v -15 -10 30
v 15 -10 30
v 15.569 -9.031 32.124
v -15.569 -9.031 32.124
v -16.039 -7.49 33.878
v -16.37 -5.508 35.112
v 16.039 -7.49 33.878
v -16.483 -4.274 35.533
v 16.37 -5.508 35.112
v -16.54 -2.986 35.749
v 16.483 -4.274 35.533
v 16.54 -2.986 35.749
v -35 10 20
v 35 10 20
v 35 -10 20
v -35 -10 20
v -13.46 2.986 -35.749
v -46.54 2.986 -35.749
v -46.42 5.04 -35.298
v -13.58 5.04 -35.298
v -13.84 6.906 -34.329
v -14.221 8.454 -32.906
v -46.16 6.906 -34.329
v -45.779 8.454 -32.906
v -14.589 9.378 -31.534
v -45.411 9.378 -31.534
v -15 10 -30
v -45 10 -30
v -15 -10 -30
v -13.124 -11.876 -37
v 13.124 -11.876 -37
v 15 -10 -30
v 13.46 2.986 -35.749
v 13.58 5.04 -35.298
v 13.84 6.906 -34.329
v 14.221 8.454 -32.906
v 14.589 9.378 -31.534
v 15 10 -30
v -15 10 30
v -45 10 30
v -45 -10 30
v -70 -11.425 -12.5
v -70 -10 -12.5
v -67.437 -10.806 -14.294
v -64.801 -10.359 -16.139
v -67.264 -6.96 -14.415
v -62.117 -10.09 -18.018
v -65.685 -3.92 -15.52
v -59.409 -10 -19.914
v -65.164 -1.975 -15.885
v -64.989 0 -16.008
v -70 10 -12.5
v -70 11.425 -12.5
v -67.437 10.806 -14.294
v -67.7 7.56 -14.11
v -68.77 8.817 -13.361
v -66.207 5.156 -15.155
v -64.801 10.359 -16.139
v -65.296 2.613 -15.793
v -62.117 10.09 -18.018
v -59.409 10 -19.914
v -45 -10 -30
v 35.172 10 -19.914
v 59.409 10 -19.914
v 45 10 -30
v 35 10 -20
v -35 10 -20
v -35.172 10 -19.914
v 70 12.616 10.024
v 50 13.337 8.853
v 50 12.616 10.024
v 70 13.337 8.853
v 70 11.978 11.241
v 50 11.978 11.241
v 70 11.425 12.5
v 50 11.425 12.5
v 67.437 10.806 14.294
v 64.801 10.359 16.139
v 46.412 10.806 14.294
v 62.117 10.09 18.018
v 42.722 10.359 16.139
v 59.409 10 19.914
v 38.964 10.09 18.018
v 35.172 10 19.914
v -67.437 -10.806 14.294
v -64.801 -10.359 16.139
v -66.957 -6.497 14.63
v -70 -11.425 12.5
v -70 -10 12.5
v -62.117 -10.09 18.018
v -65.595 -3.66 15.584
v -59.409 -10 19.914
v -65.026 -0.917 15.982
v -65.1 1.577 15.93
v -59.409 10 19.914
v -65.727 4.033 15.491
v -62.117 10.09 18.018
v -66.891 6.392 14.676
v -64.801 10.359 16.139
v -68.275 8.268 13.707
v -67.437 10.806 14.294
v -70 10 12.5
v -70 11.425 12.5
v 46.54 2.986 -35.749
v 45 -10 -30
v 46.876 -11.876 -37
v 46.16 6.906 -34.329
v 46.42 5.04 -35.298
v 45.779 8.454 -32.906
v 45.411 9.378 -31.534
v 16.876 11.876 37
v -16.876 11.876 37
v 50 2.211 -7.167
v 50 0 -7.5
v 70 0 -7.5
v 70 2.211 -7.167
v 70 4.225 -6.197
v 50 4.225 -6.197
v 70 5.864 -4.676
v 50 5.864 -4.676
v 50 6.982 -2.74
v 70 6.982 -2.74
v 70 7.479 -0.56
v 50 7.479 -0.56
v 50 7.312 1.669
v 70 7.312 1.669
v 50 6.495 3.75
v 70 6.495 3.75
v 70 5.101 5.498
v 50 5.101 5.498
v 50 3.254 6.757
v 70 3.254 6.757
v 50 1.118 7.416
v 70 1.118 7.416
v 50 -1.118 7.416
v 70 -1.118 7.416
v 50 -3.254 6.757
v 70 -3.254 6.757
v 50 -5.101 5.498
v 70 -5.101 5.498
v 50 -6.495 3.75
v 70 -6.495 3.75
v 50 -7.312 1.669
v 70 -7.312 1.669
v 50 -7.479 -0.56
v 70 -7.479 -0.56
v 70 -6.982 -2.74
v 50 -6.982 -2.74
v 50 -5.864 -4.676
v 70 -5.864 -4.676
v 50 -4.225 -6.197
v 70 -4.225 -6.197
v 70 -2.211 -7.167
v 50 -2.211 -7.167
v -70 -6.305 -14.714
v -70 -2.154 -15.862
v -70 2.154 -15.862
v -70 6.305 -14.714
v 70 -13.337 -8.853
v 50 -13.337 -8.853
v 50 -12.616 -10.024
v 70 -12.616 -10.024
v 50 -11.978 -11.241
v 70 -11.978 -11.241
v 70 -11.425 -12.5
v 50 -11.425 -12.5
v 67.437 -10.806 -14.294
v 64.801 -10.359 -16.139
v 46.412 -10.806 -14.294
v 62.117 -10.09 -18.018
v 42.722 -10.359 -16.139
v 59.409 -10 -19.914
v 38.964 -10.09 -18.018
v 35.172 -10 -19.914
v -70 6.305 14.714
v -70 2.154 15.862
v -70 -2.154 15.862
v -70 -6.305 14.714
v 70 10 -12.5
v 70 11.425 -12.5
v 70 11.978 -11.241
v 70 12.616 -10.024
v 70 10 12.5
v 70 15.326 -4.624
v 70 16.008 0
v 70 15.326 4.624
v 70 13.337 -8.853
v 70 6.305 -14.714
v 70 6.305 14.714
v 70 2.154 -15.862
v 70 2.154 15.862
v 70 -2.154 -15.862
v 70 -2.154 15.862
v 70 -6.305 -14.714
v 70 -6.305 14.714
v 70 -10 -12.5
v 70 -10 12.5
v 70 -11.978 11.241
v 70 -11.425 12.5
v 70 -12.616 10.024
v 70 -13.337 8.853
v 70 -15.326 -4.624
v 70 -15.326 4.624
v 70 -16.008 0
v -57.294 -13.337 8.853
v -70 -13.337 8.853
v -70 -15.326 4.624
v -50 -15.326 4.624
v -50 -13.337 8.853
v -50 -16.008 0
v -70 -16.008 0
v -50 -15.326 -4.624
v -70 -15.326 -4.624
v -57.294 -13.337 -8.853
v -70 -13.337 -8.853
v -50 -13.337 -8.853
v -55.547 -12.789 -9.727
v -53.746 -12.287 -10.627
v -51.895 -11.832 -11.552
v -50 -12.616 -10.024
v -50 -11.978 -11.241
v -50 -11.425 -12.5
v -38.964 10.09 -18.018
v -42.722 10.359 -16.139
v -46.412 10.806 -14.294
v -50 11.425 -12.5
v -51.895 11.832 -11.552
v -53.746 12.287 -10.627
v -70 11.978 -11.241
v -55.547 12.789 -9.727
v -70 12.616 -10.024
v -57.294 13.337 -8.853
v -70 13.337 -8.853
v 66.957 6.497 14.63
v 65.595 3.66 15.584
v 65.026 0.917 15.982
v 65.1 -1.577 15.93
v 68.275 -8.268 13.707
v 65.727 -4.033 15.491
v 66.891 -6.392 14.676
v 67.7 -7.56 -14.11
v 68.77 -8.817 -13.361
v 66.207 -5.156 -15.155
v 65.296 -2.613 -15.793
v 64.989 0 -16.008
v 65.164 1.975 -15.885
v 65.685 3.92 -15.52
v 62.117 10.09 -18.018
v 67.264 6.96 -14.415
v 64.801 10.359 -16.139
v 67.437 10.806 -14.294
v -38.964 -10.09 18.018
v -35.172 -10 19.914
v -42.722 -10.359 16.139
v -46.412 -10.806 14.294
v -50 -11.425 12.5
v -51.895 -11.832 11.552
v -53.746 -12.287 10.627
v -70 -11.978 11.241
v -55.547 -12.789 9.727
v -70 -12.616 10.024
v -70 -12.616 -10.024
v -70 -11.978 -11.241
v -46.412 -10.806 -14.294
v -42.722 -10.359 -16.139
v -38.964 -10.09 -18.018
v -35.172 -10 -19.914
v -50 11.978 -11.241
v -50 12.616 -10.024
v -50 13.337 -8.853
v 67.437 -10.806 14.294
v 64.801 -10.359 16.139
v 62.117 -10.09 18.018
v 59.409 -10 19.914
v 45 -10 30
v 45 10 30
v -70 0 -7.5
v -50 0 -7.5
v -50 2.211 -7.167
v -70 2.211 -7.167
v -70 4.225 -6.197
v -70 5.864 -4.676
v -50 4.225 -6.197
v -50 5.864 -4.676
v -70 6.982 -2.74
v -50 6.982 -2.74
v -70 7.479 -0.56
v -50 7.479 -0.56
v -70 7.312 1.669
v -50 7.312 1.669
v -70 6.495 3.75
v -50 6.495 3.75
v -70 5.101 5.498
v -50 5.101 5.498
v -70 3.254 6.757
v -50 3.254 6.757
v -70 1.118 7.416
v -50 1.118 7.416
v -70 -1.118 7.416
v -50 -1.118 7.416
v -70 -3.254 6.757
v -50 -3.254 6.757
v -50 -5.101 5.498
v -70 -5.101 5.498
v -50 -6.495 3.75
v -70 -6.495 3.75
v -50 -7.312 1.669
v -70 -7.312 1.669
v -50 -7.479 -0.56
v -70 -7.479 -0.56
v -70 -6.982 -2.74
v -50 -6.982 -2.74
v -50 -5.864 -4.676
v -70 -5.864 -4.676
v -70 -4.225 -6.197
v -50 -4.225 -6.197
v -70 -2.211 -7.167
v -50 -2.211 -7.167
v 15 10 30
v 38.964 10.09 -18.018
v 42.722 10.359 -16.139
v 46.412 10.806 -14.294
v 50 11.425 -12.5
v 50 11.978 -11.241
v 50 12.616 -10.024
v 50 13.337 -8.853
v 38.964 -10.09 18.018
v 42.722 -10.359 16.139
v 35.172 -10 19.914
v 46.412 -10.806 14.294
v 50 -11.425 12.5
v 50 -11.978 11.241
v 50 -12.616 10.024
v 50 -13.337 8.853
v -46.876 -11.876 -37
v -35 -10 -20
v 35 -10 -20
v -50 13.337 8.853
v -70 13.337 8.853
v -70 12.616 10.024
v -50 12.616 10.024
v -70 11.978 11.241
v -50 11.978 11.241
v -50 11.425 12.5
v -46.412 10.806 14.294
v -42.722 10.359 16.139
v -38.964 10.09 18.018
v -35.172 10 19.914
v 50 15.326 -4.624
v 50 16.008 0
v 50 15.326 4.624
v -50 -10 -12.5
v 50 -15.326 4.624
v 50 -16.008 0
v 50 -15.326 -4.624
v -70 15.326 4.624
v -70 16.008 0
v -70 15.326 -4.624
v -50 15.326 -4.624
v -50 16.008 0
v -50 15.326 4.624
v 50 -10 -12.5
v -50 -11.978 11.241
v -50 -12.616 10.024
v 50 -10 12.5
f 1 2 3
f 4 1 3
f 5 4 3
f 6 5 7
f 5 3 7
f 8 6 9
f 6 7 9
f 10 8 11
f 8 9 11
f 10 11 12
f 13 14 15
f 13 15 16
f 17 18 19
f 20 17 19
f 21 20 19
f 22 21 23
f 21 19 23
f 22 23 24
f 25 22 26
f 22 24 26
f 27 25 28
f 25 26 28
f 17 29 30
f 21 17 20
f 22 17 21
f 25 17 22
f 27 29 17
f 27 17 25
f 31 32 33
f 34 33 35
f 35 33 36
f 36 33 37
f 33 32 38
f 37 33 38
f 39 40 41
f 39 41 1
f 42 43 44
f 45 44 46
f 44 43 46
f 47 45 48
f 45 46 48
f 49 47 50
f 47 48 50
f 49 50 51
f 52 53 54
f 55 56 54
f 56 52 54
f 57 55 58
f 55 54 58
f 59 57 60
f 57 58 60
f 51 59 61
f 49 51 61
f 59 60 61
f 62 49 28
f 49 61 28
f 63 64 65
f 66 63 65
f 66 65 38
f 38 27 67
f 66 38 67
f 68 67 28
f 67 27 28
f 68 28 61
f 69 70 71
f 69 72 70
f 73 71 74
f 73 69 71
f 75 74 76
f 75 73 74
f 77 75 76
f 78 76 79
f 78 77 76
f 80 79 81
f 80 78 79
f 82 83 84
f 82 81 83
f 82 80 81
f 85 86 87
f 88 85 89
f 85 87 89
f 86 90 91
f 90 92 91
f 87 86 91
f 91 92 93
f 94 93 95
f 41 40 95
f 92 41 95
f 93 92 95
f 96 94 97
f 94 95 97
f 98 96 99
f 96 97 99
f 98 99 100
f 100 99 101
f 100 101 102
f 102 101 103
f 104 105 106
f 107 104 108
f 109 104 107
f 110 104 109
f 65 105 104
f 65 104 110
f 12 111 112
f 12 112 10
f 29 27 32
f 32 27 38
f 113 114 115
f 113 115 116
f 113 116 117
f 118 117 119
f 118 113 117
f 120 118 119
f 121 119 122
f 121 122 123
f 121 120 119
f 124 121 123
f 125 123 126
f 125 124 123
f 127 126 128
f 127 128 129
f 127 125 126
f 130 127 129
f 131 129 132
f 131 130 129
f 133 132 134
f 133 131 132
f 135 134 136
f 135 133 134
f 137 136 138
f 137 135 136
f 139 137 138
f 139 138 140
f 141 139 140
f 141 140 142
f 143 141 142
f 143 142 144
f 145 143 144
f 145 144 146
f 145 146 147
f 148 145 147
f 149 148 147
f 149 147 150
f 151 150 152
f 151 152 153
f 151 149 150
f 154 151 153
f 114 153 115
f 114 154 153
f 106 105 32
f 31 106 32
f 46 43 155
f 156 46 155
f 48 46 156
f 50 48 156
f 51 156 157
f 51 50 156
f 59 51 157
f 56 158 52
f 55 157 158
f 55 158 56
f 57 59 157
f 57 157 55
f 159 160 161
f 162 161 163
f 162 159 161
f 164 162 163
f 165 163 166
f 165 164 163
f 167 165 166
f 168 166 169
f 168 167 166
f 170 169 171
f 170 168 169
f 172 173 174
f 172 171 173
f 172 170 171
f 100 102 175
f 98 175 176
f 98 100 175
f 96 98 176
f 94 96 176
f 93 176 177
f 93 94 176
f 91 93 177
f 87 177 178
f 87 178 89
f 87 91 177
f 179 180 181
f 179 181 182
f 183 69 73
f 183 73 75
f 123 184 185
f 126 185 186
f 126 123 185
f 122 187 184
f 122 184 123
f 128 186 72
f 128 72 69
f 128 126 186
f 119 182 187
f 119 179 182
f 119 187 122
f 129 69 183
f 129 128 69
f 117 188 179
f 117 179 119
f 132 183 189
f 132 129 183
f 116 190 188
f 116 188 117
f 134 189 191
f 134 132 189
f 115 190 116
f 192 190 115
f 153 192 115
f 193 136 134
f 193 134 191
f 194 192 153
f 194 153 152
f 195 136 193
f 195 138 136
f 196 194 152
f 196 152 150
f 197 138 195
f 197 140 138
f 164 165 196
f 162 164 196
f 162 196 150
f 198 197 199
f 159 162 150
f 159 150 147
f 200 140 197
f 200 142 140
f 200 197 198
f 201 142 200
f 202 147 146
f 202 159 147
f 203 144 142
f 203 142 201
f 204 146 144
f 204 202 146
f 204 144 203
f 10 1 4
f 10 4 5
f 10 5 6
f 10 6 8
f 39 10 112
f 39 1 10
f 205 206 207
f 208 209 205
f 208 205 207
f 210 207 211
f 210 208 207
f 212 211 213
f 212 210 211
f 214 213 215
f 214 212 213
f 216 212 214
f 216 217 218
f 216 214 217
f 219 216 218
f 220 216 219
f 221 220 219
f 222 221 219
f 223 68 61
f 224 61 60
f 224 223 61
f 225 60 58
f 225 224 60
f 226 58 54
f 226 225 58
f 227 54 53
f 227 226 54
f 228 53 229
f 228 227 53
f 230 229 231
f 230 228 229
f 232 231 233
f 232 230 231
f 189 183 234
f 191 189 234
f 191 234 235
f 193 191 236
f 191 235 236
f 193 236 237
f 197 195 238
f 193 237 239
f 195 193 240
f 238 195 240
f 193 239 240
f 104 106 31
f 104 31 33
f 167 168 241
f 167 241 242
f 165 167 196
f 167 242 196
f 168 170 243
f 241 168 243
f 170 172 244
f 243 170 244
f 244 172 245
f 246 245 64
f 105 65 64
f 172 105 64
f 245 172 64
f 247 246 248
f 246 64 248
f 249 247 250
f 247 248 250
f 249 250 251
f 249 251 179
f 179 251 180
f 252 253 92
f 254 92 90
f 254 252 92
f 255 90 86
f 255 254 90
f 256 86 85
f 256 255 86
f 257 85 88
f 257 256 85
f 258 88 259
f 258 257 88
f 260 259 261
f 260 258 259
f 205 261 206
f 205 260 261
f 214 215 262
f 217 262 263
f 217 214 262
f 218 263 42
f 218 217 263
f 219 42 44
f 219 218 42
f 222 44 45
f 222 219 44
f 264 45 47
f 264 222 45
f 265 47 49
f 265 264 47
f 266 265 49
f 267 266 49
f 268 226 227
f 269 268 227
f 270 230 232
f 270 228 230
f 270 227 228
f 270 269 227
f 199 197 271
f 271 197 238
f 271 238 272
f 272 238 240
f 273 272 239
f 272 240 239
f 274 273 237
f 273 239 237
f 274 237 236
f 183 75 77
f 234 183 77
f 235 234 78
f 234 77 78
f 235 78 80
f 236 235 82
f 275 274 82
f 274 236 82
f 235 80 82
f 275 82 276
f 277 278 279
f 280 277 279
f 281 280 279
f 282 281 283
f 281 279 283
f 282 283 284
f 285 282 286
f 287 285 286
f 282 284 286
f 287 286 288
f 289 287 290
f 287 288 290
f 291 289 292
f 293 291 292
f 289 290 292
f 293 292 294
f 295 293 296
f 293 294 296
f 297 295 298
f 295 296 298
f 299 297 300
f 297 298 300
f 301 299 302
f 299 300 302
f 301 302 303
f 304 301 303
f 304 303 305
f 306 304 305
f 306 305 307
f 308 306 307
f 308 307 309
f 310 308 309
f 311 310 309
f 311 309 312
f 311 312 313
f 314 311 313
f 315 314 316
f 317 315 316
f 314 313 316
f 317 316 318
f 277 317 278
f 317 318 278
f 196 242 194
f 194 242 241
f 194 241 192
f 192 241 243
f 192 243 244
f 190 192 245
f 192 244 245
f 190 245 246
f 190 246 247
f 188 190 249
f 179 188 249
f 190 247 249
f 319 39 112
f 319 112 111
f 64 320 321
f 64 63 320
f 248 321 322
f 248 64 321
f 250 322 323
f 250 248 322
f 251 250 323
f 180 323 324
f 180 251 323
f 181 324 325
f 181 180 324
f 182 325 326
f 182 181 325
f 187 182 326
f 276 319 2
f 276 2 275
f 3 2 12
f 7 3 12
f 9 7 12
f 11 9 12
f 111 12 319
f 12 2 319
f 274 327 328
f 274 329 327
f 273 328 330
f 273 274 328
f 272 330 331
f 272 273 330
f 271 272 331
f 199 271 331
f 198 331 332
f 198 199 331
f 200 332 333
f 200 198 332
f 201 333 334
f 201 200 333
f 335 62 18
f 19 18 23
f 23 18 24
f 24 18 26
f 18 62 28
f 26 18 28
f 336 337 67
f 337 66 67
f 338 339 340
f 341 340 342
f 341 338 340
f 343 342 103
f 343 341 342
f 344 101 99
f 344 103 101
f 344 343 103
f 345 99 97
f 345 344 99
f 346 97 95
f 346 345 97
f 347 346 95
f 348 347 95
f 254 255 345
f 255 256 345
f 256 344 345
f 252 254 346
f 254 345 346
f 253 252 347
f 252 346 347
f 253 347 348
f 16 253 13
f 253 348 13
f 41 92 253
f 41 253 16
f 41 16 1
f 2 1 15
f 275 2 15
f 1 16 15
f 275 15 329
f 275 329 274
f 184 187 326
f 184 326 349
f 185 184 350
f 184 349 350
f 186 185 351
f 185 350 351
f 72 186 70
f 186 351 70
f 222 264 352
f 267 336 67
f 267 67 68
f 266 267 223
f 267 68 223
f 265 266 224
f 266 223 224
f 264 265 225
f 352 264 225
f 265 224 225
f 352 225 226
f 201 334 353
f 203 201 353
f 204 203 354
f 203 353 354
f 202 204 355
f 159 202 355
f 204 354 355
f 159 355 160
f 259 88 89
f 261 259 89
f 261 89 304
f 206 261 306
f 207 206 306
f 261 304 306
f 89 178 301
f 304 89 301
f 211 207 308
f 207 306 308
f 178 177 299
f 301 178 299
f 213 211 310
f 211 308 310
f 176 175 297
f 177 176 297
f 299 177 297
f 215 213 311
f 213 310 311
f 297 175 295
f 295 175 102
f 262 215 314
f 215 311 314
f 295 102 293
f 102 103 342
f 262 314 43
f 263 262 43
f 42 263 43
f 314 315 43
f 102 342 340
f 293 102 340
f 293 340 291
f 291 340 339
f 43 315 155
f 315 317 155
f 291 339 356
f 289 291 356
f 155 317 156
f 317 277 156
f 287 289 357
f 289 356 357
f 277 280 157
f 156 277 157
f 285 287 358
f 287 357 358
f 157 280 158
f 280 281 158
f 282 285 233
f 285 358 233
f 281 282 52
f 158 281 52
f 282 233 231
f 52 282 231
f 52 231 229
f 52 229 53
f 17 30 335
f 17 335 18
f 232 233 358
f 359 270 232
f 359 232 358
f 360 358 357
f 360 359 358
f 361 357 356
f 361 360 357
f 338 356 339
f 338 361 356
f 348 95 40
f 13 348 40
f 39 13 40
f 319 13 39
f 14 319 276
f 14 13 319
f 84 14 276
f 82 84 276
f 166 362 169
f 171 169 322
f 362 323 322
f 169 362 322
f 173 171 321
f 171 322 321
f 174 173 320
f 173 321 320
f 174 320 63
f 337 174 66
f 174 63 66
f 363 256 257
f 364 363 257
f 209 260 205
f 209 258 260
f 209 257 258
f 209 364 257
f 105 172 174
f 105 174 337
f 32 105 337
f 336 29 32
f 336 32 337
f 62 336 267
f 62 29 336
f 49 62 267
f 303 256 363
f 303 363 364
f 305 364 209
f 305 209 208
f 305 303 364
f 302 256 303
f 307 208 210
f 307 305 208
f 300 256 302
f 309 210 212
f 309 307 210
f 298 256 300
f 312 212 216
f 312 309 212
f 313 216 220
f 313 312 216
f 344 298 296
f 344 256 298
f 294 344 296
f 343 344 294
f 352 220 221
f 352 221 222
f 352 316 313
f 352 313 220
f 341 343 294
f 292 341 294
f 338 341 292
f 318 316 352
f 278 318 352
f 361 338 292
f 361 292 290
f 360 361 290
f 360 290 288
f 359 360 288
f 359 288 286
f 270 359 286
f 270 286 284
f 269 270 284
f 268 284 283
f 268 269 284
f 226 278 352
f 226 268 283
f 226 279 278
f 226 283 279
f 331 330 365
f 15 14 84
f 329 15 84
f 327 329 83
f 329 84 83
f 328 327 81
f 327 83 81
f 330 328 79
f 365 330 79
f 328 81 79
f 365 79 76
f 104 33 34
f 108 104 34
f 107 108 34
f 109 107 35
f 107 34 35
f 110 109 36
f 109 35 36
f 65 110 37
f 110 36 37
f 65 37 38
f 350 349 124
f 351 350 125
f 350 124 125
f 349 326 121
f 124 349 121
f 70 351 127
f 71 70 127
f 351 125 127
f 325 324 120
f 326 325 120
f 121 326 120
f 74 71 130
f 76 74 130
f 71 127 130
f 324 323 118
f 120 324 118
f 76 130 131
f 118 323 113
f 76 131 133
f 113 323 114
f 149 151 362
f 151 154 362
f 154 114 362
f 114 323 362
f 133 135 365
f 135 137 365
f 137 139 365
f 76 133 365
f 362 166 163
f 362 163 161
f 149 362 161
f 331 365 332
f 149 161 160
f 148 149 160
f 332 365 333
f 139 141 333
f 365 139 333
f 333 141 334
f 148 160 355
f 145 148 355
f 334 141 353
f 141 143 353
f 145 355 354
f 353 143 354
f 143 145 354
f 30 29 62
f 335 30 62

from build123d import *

# Parameters (mm, degrees)
RESSALTO_EXTRUS_O1_DEPTH           = 10
RESSALTO_EXTRUS_O1_2_DEPTH         = 10
ESBO_O2_R                          = 16.007810594
ESBO_O2_R_2                        = 7.5
RESSALTO_EXTRUS_O2_DEPTH           = 20
FILETE1_R                          = 20
ESBO_O3_W                          = 30
ESBO_O3_H                          = 20
RESSALTO_EXTRUS_O3_DEPTH           = 7
RESSALTO_EXTRUS_O3_DRAFT           = -15
ESBO_O4_W                          = 30
ESBO_O4_H                          = 20
RESSALTO_EXTRUS_O4_DEPTH           = 7
RESSALTO_EXTRUS_O4_DRAFT           = -15
RESSALTO_EXTRUS_O4_PROFILE_2_DEPTH = 7
RESSALTO_EXTRUS_O4_PROFILE_2_DRAFT = -15
CORTE_EXTRUS_O1_DEPTH              = 16.88
CORTE_EXTRUS_O2_DEPTH              = 46.88
FILETE4_R                          = 8


with BuildPart() as part:
    # Esboço1 → Ressalto-extrusão1 (new, symmetric)
    with BuildSketch(Plane(origin=(0, 0, 0), x_dir=(1, 0, 0), z_dir=(0, 1, 0))):
        Polygon((45, -30), (70, -12.5), (50, -12.5), (35, -20), (-35, -20), (-50, -12.5), (-70, -12.5), (-45, -30), align=None)
    extrude(amount=RESSALTO_EXTRUS_O1_DEPTH, both=True)



with BuildPart() as body_2:
    # Esboço1 → Ressalto-extrus_o1 2 (new, symmetric)
    with BuildSketch(Plane(origin=(0, 0, 0), x_dir=(1, 0, 0), z_dir=(0, 1, 0))):
        Polygon((70, 12.5), (50, 12.5), (35, 20), (-35, 20), (-50, 12.5), (-70, 12.5), (-45, 30), (45, 30), align=None)
    extrude(amount=RESSALTO_EXTRUS_O1_2_DEPTH, both=True)


with BuildPart() as part_1:
    add(part.part)

    add(body_2.part)  # Ressalto-extrusão2 merges body 2
    # Esboço2 → Ressalto-extrusão2 (add)
    with BuildSketch(Plane(origin=(-50, 0, 0), x_dir=(0, 0, -1), z_dir=(1, 0, 0))):
        Circle(ESBO_O2_R)
        Circle(ESBO_O2_R_2, mode=Mode.SUBTRACT)
    ressalto_extrus_o2 = extrude(amount=-RESSALTO_EXTRUS_O2_DEPTH)

    # Espelhar1: Ressalto-extrusão2 across plane
    add(ressalto_extrus_o2.mirror(Plane(origin=(0, 0, 0), x_dir=(0, 0, 1), z_dir=(1, 0, 0))))

    # Filete1
    # the kernel refuses this fillet: 20 mm, written as the material it adds along each edge
    with BuildSketch(Plane(origin=(70, -10, 12.5), x_dir=(0, 0, 1), z_dir=(-1, 0, 0))) as filete1_piece_1_section:
        with BuildLine():
            CenterArc((7.413875156, -20), FILETE1_R, 90, 33.576041437)
            ThreePointArc((-3.646989044, -3.336948565), (-1.693910252, -1.810098405), (0, 0))
            Line((0, 0), (7.413875156, 0))
        make_face()
    filete1_piece_1 = extrude(amount=20, mode=Mode.PRIVATE)
    filete1_piece_1 = split(filete1_piece_1, bisect_by=Plane(origin=(62.463989949, -10.639640977, 17.775207036), z_dir=(-0.5734623443633283, 0, -0.8192319205190406)), keep=Keep.TOP, mode=Mode.PRIVATE)
    filete1_piece_1 = split(filete1_piece_1, bisect_by=Plane(origin=(57.171735223, -10.639640977, 8.914132389), z_dir=(0.4472135954999588, 0, 0.8944271909999154)), keep=Keep.TOP, mode=Mode.PRIVATE)
    add(filete1_piece_1)
    with BuildSketch(Plane(origin=(70, -10, 12.5), x_dir=(0, 0, 1), z_dir=(-1, 0, 0))) as filete1_piece_2_section:
        with BuildLine():
            CenterArc((7.413875156, -20), FILETE1_R, 90, 33.576041437)
            ThreePointArc((-3.646989044, -3.336948565), (-1.693910252, -1.810098405), (0, 0))
            Line((0, 0), (7.413875156, 0))
        make_face()
    filete1_piece_2 = extrude(amount=20, mode=Mode.PRIVATE)
    filete1_piece_2 = split(filete1_piece_2, bisect_by=Plane(origin=(52.590686854, -12.043119704, 11.204656573), z_dir=(-0.4472135954999588, 0, -0.8944271909999154)), keep=Keep.TOP, mode=Mode.PRIVATE)
    add(filete1_piece_2)
    with BuildSketch(Plane(origin=(70, -10, 12.5), x_dir=(0, 0, 1), z_dir=(-1, 0, 0))) as filete1_piece_3_section:
        with BuildLine():
            CenterArc((7.413875156, -20), FILETE1_R, 90, 33.576041437)
            ThreePointArc((-3.646989044, -3.336948565), (-1.693910252, -1.810098405), (0, 0))
            Line((0, 0), (7.413875156, 0))
        make_face()
    filete1_piece_3 = extrude(amount=38.534687891, mode=Mode.PRIVATE)
    filete1_piece_3 = split(filete1_piece_3, bisect_by=Plane(origin=(44.945861579, -9.976895513, 15.027069211), z_dir=(0.4472135954999588, 0, 0.8944271909999154)), keep=Keep.TOP, mode=Mode.PRIVATE)
    filete1_piece_3 = split(filete1_piece_3, bisect_by=Plane(origin=(50, -9.976895513, 16.711782017), z_dir=(-1, 0, 0)), keep=Keep.TOP, mode=Mode.PRIVATE)
    add(filete1_piece_3)
    with BuildSketch(Plane(origin=(-31.465312109, 10, 12.5), x_dir=(0, 0.6750510749314106, -0.7377709985042425), z_dir=(-1, 0, 0))) as filete1_piece_4_section:
        with BuildLine():
            CenterArc((8.031279422, -19.760164364), FILETE1_R, 98.882075154, 33.576041437)
            Line((-5.469742077, -5.004744394), (0, 0))
            ThreePointArc((0, 0), (2.471626732, -0.191962172), (4.943253464, 0))
        make_face()
    filete1_piece_4 = extrude(amount=38.534687891, mode=Mode.PRIVATE)
    filete1_piece_4 = split(filete1_piece_4, bisect_by=Plane(origin=(-50, 9.976895512, 16.711782019), z_dir=(1, 0, 0)), keep=Keep.TOP, mode=Mode.PRIVATE)
    filete1_piece_4 = split(filete1_piece_4, bisect_by=Plane(origin=(-44.945861578, 9.976895512, 15.027069211), z_dir=(-0.4472135954999591, 0, 0.8944271909999153)), keep=Keep.TOP, mode=Mode.PRIVATE)
    add(filete1_piece_4)
    with BuildSketch(Plane(origin=(-50, 10, 12.5), x_dir=(0, 0.6750510749314104, -0.7377709985042427), z_dir=(-1, 0, 0))) as filete1_piece_5_section:
        with BuildLine():
            CenterArc((8.031279422, -19.760164364), FILETE1_R, 98.882075154, 33.576041437)
            Line((-5.469742077, -5.004744394), (0, 0))
            ThreePointArc((0, 0), (2.471626732, -0.191962172), (4.943253464, 0))
        make_face()
    filete1_piece_5 = extrude(amount=20, mode=Mode.PRIVATE)
    filete1_piece_5 = split(filete1_piece_5, bisect_by=Plane(origin=(-52.590686846, 12.043119705, 11.204656577), z_dir=(0.4472135954999591, 0, -0.8944271909999153)), keep=Keep.TOP, mode=Mode.PRIVATE)
    add(filete1_piece_5)
    with BuildSketch(Plane(origin=(-50, 10, 12.5), x_dir=(0, 0.6750510749314104, -0.7377709985042427), z_dir=(-1, 0, 0))) as filete1_piece_6_section:
        with BuildLine():
            CenterArc((8.031279422, -19.760164364), FILETE1_R, 98.882075154, 33.576041437)
            Line((-5.469742077, -5.004744394), (0, 0))
            ThreePointArc((0, 0), (2.471626732, -0.191962172), (4.943253464, 0))
        make_face()
    filete1_piece_6 = extrude(amount=20, mode=Mode.PRIVATE)
    filete1_piece_6 = split(filete1_piece_6, bisect_by=Plane(origin=(-62.463989948, 10.639640977, 17.775207036), z_dir=(0.5734623443633283, 0, -0.8192319205190406)), keep=Keep.TOP, mode=Mode.PRIVATE)
    filete1_piece_6 = split(filete1_piece_6, bisect_by=Plane(origin=(-57.171735222, 10.639640977, 8.914132389), z_dir=(-0.4472135954999591, 0, 0.8944271909999153)), keep=Keep.TOP, mode=Mode.PRIVATE)
    add(filete1_piece_6)
    with BuildSketch(Plane(origin=(70, 10, -12.5), x_dir=(0, 0.67505107493141, 0.737770998504243), z_dir=(-1, 0, 0))) as filete1_piece_7_section:
        with BuildLine():
            CenterArc((8.031279422, 19.760164364), FILETE1_R, 227.541883409, 33.576041437)
            Line((-5.469742077, 5.004744394), (0, 0))
            ThreePointArc((0, 0), (2.471626732, 0.191962172), (4.943253464, 0))
        make_face()
    filete1_piece_7 = extrude(amount=20, mode=Mode.PRIVATE)
    filete1_piece_7 = split(filete1_piece_7, bisect_by=Plane(origin=(57.171735222, 10.639640977, -8.914132389), z_dir=(0.44721359549995815, 0, -0.8944271909999159)), keep=Keep.TOP, mode=Mode.PRIVATE)
    filete1_piece_7 = split(filete1_piece_7, bisect_by=Plane(origin=(62.463989948, 10.639640977, -17.775207036), z_dir=(-0.5734623443633284, 0, 0.8192319205190405)), keep=Keep.TOP, mode=Mode.PRIVATE)
    add(filete1_piece_7)
    with BuildSketch(Plane(origin=(70, 10, -12.5), x_dir=(0, 0.67505107493141, 0.737770998504243), z_dir=(-1, 0, 0))) as filete1_piece_8_section:
        with BuildLine():
            CenterArc((8.031279422, 19.760164364), FILETE1_R, 227.541883409, 33.576041437)
            Line((-5.469742077, 5.004744394), (0, 0))
            ThreePointArc((0, 0), (2.471626732, 0.191962172), (4.943253464, 0))
        make_face()
    filete1_piece_8 = extrude(amount=38.534687891, mode=Mode.PRIVATE)
    filete1_piece_8 = split(filete1_piece_8, bisect_by=Plane(origin=(44.945861578, 9.976895512, -15.027069211), z_dir=(0.44721359549995815, 0, -0.8944271909999159)), keep=Keep.TOP, mode=Mode.PRIVATE)
    filete1_piece_8 = split(filete1_piece_8, bisect_by=Plane(origin=(50, 9.976895512, -16.711782019), z_dir=(-1, 0, 0)), keep=Keep.TOP, mode=Mode.PRIVATE)
    add(filete1_piece_8)
    with BuildSketch(Plane(origin=(70, 10, -12.5), x_dir=(0, 0.67505107493141, 0.737770998504243), z_dir=(-1, 0, 0))) as filete1_piece_9_section:
        with BuildLine():
            CenterArc((8.031279422, 19.760164364), FILETE1_R, 227.541883409, 33.576041437)
            Line((-5.469742077, 5.004744394), (0, 0))
            ThreePointArc((0, 0), (2.471626732, 0.191962172), (4.943253464, 0))
        make_face()
    filete1_piece_9 = extrude(amount=20, mode=Mode.PRIVATE)
    filete1_piece_9 = split(filete1_piece_9, bisect_by=Plane(origin=(52.590686846, 12.043119705, -11.204656577), z_dir=(-0.44721359549995815, 0, 0.8944271909999159)), keep=Keep.TOP, mode=Mode.PRIVATE)
    add(filete1_piece_9)
    with BuildSketch(Plane(origin=(-50, 10, -12.5), x_dir=(0, 0, -1), z_dir=(-1, 0, 0))) as filete1_piece_10_section:
        with BuildLine():
            CenterArc((7.413875156, -20), FILETE1_R, 90, 33.576041437)
            ThreePointArc((-3.646989044, -3.336948565), (-1.693910252, -1.810098405), (0, 0))
            Line((0, 0), (7.413875156, 0))
        make_face()
    filete1_piece_10 = extrude(amount=20, mode=Mode.PRIVATE)
    filete1_piece_10 = split(filete1_piece_10, bisect_by=Plane(origin=(-52.590686854, 12.043119704, -11.204656573), z_dir=(0.44721359549995776, 0, 0.894427190999916)), keep=Keep.TOP, mode=Mode.PRIVATE)
    add(filete1_piece_10)
    with BuildSketch(Plane(origin=(-31.465312109, 10, -12.5), x_dir=(0, 0, -1), z_dir=(-1, 0, 0))) as filete1_piece_11_section:
        with BuildLine():
            CenterArc((7.413875156, -20), FILETE1_R, 90, 33.576041437)
            ThreePointArc((-3.646989044, -3.336948565), (-1.693910252, -1.810098405), (0, 0))
            Line((0, 0), (7.413875156, 0))
        make_face()
    filete1_piece_11 = extrude(amount=38.534687891, mode=Mode.PRIVATE)
    filete1_piece_11 = split(filete1_piece_11, bisect_by=Plane(origin=(-50, 9.976895513, -16.711782017), z_dir=(1, 0, 0)), keep=Keep.TOP, mode=Mode.PRIVATE)
    filete1_piece_11 = split(filete1_piece_11, bisect_by=Plane(origin=(-44.945861579, 9.976895513, -15.027069211), z_dir=(-0.44721359549995776, 0, -0.894427190999916)), keep=Keep.TOP, mode=Mode.PRIVATE)
    add(filete1_piece_11)
    with BuildSketch(Plane(origin=(-50, 10, -12.5), x_dir=(0, 0, -1), z_dir=(-1, 0, 0))) as filete1_piece_12_section:
        with BuildLine():
            CenterArc((7.413875156, -20), FILETE1_R, 90, 33.576041437)
            ThreePointArc((-3.646989044, -3.336948565), (-1.693910252, -1.810098405), (0, 0))
            Line((0, 0), (7.413875156, 0))
        make_face()
    filete1_piece_12 = extrude(amount=20, mode=Mode.PRIVATE)
    filete1_piece_12 = split(filete1_piece_12, bisect_by=Plane(origin=(-57.171735223, 10.639640977, -8.914132389), z_dir=(-0.44721359549995776, 0, -0.894427190999916)), keep=Keep.TOP, mode=Mode.PRIVATE)
    filete1_piece_12 = split(filete1_piece_12, bisect_by=Plane(origin=(-62.463989949, 10.639640977, -17.775207036), z_dir=(0.5734623443633284, 0, 0.8192319205190404)), keep=Keep.TOP, mode=Mode.PRIVATE)
    add(filete1_piece_12)
    with BuildSketch(Plane(origin=(70, -10, -12.5), x_dir=(0, 0, -1), z_dir=(-1, 0, 0))) as filete1_piece_13_section:
        with BuildLine():
            CenterArc((7.413875156, 20), FILETE1_R, 236.423958563, 33.576041437)
            ThreePointArc((-3.646989044, 3.336948565), (-1.693910252, 1.810098405), (0, 0))
            Line((0, 0), (7.413875156, 0))
        make_face()
    filete1_piece_13 = extrude(amount=20, mode=Mode.PRIVATE)
    filete1_piece_13 = split(filete1_piece_13, bisect_by=Plane(origin=(57.171735223, -10.639640977, -8.914132389), z_dir=(0.44721359549995815, 0, -0.8944271909999159)), keep=Keep.TOP, mode=Mode.PRIVATE)
    filete1_piece_13 = split(filete1_piece_13, bisect_by=Plane(origin=(62.463989949, -10.639640977, -17.775207036), z_dir=(-0.5734623443633284, 0, 0.8192319205190405)), keep=Keep.TOP, mode=Mode.PRIVATE)
    add(filete1_piece_13)
    with BuildSketch(Plane(origin=(70, -10, -12.5), x_dir=(0, 0, -1), z_dir=(-1, 0, 0))) as filete1_piece_14_section:
        with BuildLine():
            CenterArc((7.413875156, 20), FILETE1_R, 236.423958563, 33.576041437)
            ThreePointArc((-3.646989044, 3.336948565), (-1.693910252, 1.810098405), (0, 0))
            Line((0, 0), (7.413875156, 0))
        make_face()
    filete1_piece_14 = extrude(amount=20, mode=Mode.PRIVATE)
    filete1_piece_14 = split(filete1_piece_14, bisect_by=Plane(origin=(52.590686854, -12.043119704, -11.204656573), z_dir=(-0.44721359549995815, 0, 0.8944271909999159)), keep=Keep.TOP, mode=Mode.PRIVATE)
    add(filete1_piece_14)
    with BuildSketch(Plane(origin=(70, -10, -12.5), x_dir=(0, 0, -1), z_dir=(-1, 0, 0))) as filete1_piece_15_section:
        with BuildLine():
            CenterArc((7.413875156, 20), FILETE1_R, 236.423958563, 33.576041437)
            ThreePointArc((-3.646989044, 3.336948565), (-1.693910252, 1.810098405), (0, 0))
            Line((0, 0), (7.413875156, 0))
        make_face()
    filete1_piece_15 = extrude(amount=38.534687891, mode=Mode.PRIVATE)
    filete1_piece_15 = split(filete1_piece_15, bisect_by=Plane(origin=(44.945861579, -9.976895513, -15.027069211), z_dir=(0.44721359549995815, 0, -0.8944271909999159)), keep=Keep.TOP, mode=Mode.PRIVATE)
    filete1_piece_15 = split(filete1_piece_15, bisect_by=Plane(origin=(50, -9.976895513, -16.711782017), z_dir=(-1, 0, 0)), keep=Keep.TOP, mode=Mode.PRIVATE)
    add(filete1_piece_15)
    with BuildSketch(Plane(origin=(-50, -10, -12.5), x_dir=(0, 0, -1), z_dir=(-1, 0, 0))) as filete1_piece_16_section:
        with BuildLine():
            CenterArc((7.413875156, 20), FILETE1_R, 236.423958563, 33.576041437)
            ThreePointArc((-3.646989044, 3.336948565), (-1.693910252, 1.810098405), (0, 0))
            Line((0, 0), (7.413875156, 0))
        make_face()
    filete1_piece_16 = extrude(amount=20, mode=Mode.PRIVATE)
    filete1_piece_16 = split(filete1_piece_16, bisect_by=Plane(origin=(-52.590686854, -12.043119704, -11.204656573), z_dir=(0.44721359549995776, 0, 0.894427190999916)), keep=Keep.TOP, mode=Mode.PRIVATE)
    add(filete1_piece_16)
    with BuildSketch(Plane(origin=(-31.465312109, -10, -12.5), x_dir=(0, 0, -1), z_dir=(-1, 0, 0))) as filete1_piece_17_section:
        with BuildLine():
            CenterArc((7.413875156, 20), FILETE1_R, 236.423958563, 33.576041437)
            ThreePointArc((-3.646989044, 3.336948565), (-1.693910252, 1.810098405), (0, 0))
            Line((0, 0), (7.413875156, 0))
        make_face()
    filete1_piece_17 = extrude(amount=38.534687891, mode=Mode.PRIVATE)
    filete1_piece_17 = split(filete1_piece_17, bisect_by=Plane(origin=(-50, -9.976895513, -16.711782017), z_dir=(1, 0, 0)), keep=Keep.TOP, mode=Mode.PRIVATE)
    filete1_piece_17 = split(filete1_piece_17, bisect_by=Plane(origin=(-44.945861579, -9.976895513, -15.027069211), z_dir=(-0.44721359549995776, 0, -0.894427190999916)), keep=Keep.TOP, mode=Mode.PRIVATE)
    add(filete1_piece_17)
    with BuildSketch(Plane(origin=(-50, -10, -12.5), x_dir=(0, 0, -1), z_dir=(-1, 0, 0))) as filete1_piece_18_section:
        with BuildLine():
            CenterArc((7.413875156, 20), FILETE1_R, 236.423958563, 33.576041437)
            ThreePointArc((-3.646989044, 3.336948565), (-1.693910252, 1.810098405), (0, 0))
            Line((0, 0), (7.413875156, 0))
        make_face()
    filete1_piece_18 = extrude(amount=20, mode=Mode.PRIVATE)
    filete1_piece_18 = split(filete1_piece_18, bisect_by=Plane(origin=(-57.171735223, -10.639640977, -8.914132389), z_dir=(-0.44721359549995776, 0, -0.894427190999916)), keep=Keep.TOP, mode=Mode.PRIVATE)
    filete1_piece_18 = split(filete1_piece_18, bisect_by=Plane(origin=(-62.463989949, -10.639640977, -17.775207036), z_dir=(0.5734623443633284, 0, 0.8192319205190404)), keep=Keep.TOP, mode=Mode.PRIVATE)
    add(filete1_piece_18)
    with BuildSketch(Plane(origin=(70, 10, 12.5), x_dir=(0, 0.6750510749314104, -0.7377709985042427), z_dir=(-1, 0, 0))) as filete1_piece_19_section:
        with BuildLine():
            CenterArc((8.031279422, -19.760164364), FILETE1_R, 98.882075154, 33.576041437)
            Line((-5.469742077, -5.004744394), (0, 0))
            ThreePointArc((0, 0), (2.471626732, -0.191962172), (4.943253464, 0))
        make_face()
    filete1_piece_19 = extrude(amount=20, mode=Mode.PRIVATE)
    filete1_piece_19 = split(filete1_piece_19, bisect_by=Plane(origin=(62.463989948, 10.639640977, 17.775207036), z_dir=(-0.5734623443633283, 0, -0.8192319205190406)), keep=Keep.TOP, mode=Mode.PRIVATE)
    filete1_piece_19 = split(filete1_piece_19, bisect_by=Plane(origin=(57.171735222, 10.639640977, 8.914132389), z_dir=(0.4472135954999588, 0, 0.8944271909999154)), keep=Keep.TOP, mode=Mode.PRIVATE)
    add(filete1_piece_19)
    with BuildSketch(Plane(origin=(70, 10, 12.5), x_dir=(0, 0.6750510749314104, -0.7377709985042427), z_dir=(-1, 0, 0))) as filete1_piece_20_section:
        with BuildLine():
            CenterArc((8.031279422, -19.760164364), FILETE1_R, 98.882075154, 33.576041437)
            Line((-5.469742077, -5.004744394), (0, 0))
            ThreePointArc((0, 0), (2.471626732, -0.191962172), (4.943253464, 0))
        make_face()
    filete1_piece_20 = extrude(amount=38.534687891, mode=Mode.PRIVATE)
    filete1_piece_20 = split(filete1_piece_20, bisect_by=Plane(origin=(50, 9.976895512, 16.711782019), z_dir=(-1, 0, 0)), keep=Keep.TOP, mode=Mode.PRIVATE)
    filete1_piece_20 = split(filete1_piece_20, bisect_by=Plane(origin=(44.945861578, 9.976895512, 15.027069211), z_dir=(0.4472135954999588, 0, 0.8944271909999154)), keep=Keep.TOP, mode=Mode.PRIVATE)
    add(filete1_piece_20)
    with BuildSketch(Plane(origin=(70, 10, 12.5), x_dir=(0, 0.6750510749314104, -0.7377709985042427), z_dir=(-1, 0, 0))) as filete1_piece_21_section:
        with BuildLine():
            CenterArc((8.031279422, -19.760164364), FILETE1_R, 98.882075154, 33.576041437)
            Line((-5.469742077, -5.004744394), (0, 0))
            ThreePointArc((0, 0), (2.471626732, -0.191962172), (4.943253464, 0))
        make_face()
    filete1_piece_21 = extrude(amount=20, mode=Mode.PRIVATE)
    filete1_piece_21 = split(filete1_piece_21, bisect_by=Plane(origin=(52.590686846, 12.043119705, 11.204656577), z_dir=(-0.4472135954999588, 0, -0.8944271909999154)), keep=Keep.TOP, mode=Mode.PRIVATE)
    add(filete1_piece_21)
    with BuildSketch(Plane(origin=(-50, -10, 12.5), x_dir=(0, 0, 1), z_dir=(-1, 0, 0))) as filete1_piece_22_section:
        with BuildLine():
            CenterArc((7.413875156, -20), FILETE1_R, 90, 33.576041437)
            ThreePointArc((-3.646989044, -3.336948565), (-1.693910252, -1.810098405), (0, 0))
            Line((0, 0), (7.413875156, 0))
        make_face()
    filete1_piece_22 = extrude(amount=20, mode=Mode.PRIVATE)
    filete1_piece_22 = split(filete1_piece_22, bisect_by=Plane(origin=(-52.590686854, -12.043119704, 11.204656573), z_dir=(0.4472135954999591, 0, -0.8944271909999153)), keep=Keep.TOP, mode=Mode.PRIVATE)
    add(filete1_piece_22)
    with BuildSketch(Plane(origin=(-31.465312109, -10, 12.5), x_dir=(0, 0, 1), z_dir=(-1, 0, 0))) as filete1_piece_23_section:
        with BuildLine():
            CenterArc((7.413875156, -20), FILETE1_R, 90, 33.576041437)
            ThreePointArc((-3.646989044, -3.336948565), (-1.693910252, -1.810098405), (0, 0))
            Line((0, 0), (7.413875156, 0))
        make_face()
    filete1_piece_23 = extrude(amount=38.534687891, mode=Mode.PRIVATE)
    filete1_piece_23 = split(filete1_piece_23, bisect_by=Plane(origin=(-44.945861579, -9.976895513, 15.027069211), z_dir=(-0.4472135954999591, 0, 0.8944271909999153)), keep=Keep.TOP, mode=Mode.PRIVATE)
    filete1_piece_23 = split(filete1_piece_23, bisect_by=Plane(origin=(-50, -9.976895513, 16.711782017), z_dir=(1, 0, 0)), keep=Keep.TOP, mode=Mode.PRIVATE)
    add(filete1_piece_23)
    with BuildSketch(Plane(origin=(-50, -10, 12.5), x_dir=(0, 0, 1), z_dir=(-1, 0, 0))) as filete1_piece_24_section:
        with BuildLine():
            CenterArc((7.413875156, -20), FILETE1_R, 90, 33.576041437)
            ThreePointArc((-3.646989044, -3.336948565), (-1.693910252, -1.810098405), (0, 0))
            Line((0, 0), (7.413875156, 0))
        make_face()
    filete1_piece_24 = extrude(amount=20, mode=Mode.PRIVATE)
    filete1_piece_24 = split(filete1_piece_24, bisect_by=Plane(origin=(-57.171735223, -10.639640977, 8.914132389), z_dir=(-0.4472135954999591, 0, 0.8944271909999153)), keep=Keep.TOP, mode=Mode.PRIVATE)
    filete1_piece_24 = split(filete1_piece_24, bisect_by=Plane(origin=(-62.463989949, -10.639640977, 17.775207036), z_dir=(0.5734623443633283, 0, -0.8192319205190406)), keep=Keep.TOP, mode=Mode.PRIVATE)
    add(filete1_piece_24)


with BuildPart() as ressalto_extrus_o3_tool:
    # Esboço3 → Ressalto-extrusão3 (with draft: the straight prism first)
    with BuildSketch(Plane.XY.offset(30)):
        Rectangle(ESBO_O3_W, ESBO_O3_H)
    extrude(amount=RESSALTO_EXTRUS_O3_DEPTH)
    # Ressalto-extrusão3: the draft: its side faces are tilted about the plane it starts from
    ressalto_extrus_o3_sides = [ressalto_extrus_o3_tool.faces().sort_by_distance(p)[0] for p in [
        (0, -10, 33.5),
        (15, 0, 33.5),
        (0, 10, 33.5),
        (-15, 0, 33.5),
    ]]
    draft(ressalto_extrus_o3_sides, Plane.XY.offset(30), RESSALTO_EXTRUS_O3_DRAFT)


with BuildPart() as part_2:
    add(part_1.part)

    # Ressalto-extrusão3: add ressalto_extrus_o3_tool
    add(ressalto_extrus_o3_tool.part)


with BuildPart() as ressalto_extrus_o4_tool:
    # Esboço4 → Ressalto-extrusão4 (with draft: the straight prism first)
    with BuildSketch(Plane(origin=(0, 0, -30), x_dir=(-1, 0, 0), z_dir=(0, 0, -1))):
        with Locations((-30, 0)):
            Rectangle(ESBO_O4_W, ESBO_O4_H)
    extrude(amount=RESSALTO_EXTRUS_O4_DEPTH)
    # Ressalto-extrusão4: the draft: its side faces are tilted about the plane it starts from
    ressalto_extrus_o4_sides = [ressalto_extrus_o4_tool.faces().sort_by_distance(p)[0] for p in [
        (45, 0, -33.5),
        (30, -10, -33.5),
        (15, 0, -33.5),
        (30, 10, -33.5),
    ]]
    draft(ressalto_extrus_o4_sides, Plane(origin=(0, 0, -30), x_dir=(-1, 0, 0), z_dir=(0, 0, -1)), RESSALTO_EXTRUS_O4_DRAFT)


with BuildPart() as part_3:
    add(part_2.part)

    # Ressalto-extrusão4: add ressalto_extrus_o4_tool
    add(ressalto_extrus_o4_tool.part)


with BuildPart() as ressalto_extrus_o4_profile_2_tool:
    # Esboço4 → Ressalto-extrusão4 profile 2 (with draft: the straight prism first)
    with BuildSketch(Plane(origin=(0, 0, -30), x_dir=(-1, 0, 0), z_dir=(0, 0, -1))):
        with Locations((30, 0)):
            Rectangle(ESBO_O4_W, ESBO_O4_H)
    extrude(amount=RESSALTO_EXTRUS_O4_PROFILE_2_DEPTH)
    # Ressalto-extrusão4 profile 2: the draft: its side faces are tilted about the plane it starts from
    ressalto_extrus_o4_profile_2_sides = [ressalto_extrus_o4_profile_2_tool.faces().sort_by_distance(p)[0] for p in [
        (-15, 0, -33.5),
        (-30, -10, -33.5),
        (-45, 0, -33.5),
        (-30, 10, -33.5),
    ]]
    draft(ressalto_extrus_o4_profile_2_sides, Plane(origin=(0, 0, -30), x_dir=(-1, 0, 0), z_dir=(0, 0, -1)), RESSALTO_EXTRUS_O4_PROFILE_2_DRAFT)


with BuildPart() as part_4:
    add(part_3.part)

    # Ressalto-extrusão4 profile 2: add ressalto_extrus_o4_profile_2_tool
    add(ressalto_extrus_o4_profile_2_tool.part)

    # Esboço8 → Corte-extrusão1 (cut, symmetric)
    with BuildSketch(Plane(origin=(0, 0, 0), x_dir=(0, 0, -1), z_dir=(1, 0, 0))):
        Polygon((-37, 11.875644347), (-35.044130132, -11.351570595), (-37, -11.875644347), align=None)
    extrude(amount=CORTE_EXTRUS_O1_DEPTH, both=True, mode=Mode.SUBTRACT)

    # Esboço7 → Corte-extrusão2 (cut, symmetric)
    with BuildSketch(Plane(origin=(0, 0, 0), x_dir=(0, 0, -1), z_dir=(1, 0, 0))):
        Polygon((37, 11.875644347), (37, -11.875644347), (35.044130132, 11.351570595), align=None)
    extrude(amount=CORTE_EXTRUS_O2_DEPTH, both=True, mode=Mode.SUBTRACT)

    # Filete4
    # the kernel refuses this fillet: 8 mm, written as the material it takes off along each edge
    with BuildSketch(Plane(origin=(37.338485297, -11.351570595, 35.044130132), x_dir=(0, 0.2588190451025217, -0.965925826289068), z_dir=(-1, 0, 0))) as filete4_piece_1:
        with BuildLine():
            CenterArc((9.358561612, -6.847584884), FILETE4_R, 121.135363687, 69.051345366)
            Line((1.484668332, -8.262436332), (1.327190466, -8.290733361))
            Line((1.327190466, -8.290733361), (-0.157477866, -0.028297029))
            Line((-0.157477866, -0.028297029), (0, 0.16))
            ThreePointArc((0, 0.16), (2.611033888, 0.16), (5.1393379, 0.136951698))
            Line((5.1393379, 0.136951698), (5.222067776, 0))
        make_face()
    extrude(amount=74.676970595, mode=Mode.SUBTRACT)
    with BuildSketch(Plane(origin=(-7.338485297, 11.351570595, -35.044130132), x_dir=(0, -0.2588190451025215, 0.9659258262890681), z_dir=(1, 0, 0)), Plane(origin=(-67.338485297, 11.351570595, -35.044130132), x_dir=(0, -0.25881904510252435, 0.9659258262890673), z_dir=(1, 0, 0))) as filete4_piece_2:
        with BuildLine():
            CenterArc((9.358561612, 6.847584884), FILETE4_R, 169.813290948, 69.051345365)
            Line((1.484668332, 8.262436332), (1.327190466, 8.290733361))
            Line((1.327190466, 8.290733361), (-0.157477866, 0.028297029))
            Line((-0.157477866, 0.028297029), (0, -0.16))
            ThreePointArc((0, -0.16), (2.611033888, -0.16), (5.1393379, -0.136951698))
            Line((5.1393379, -0.136951698), (5.222067776, 0))
        make_face()
    extrude(amount=74.676970594, mode=Mode.SUBTRACT)


solid = part_4.part
